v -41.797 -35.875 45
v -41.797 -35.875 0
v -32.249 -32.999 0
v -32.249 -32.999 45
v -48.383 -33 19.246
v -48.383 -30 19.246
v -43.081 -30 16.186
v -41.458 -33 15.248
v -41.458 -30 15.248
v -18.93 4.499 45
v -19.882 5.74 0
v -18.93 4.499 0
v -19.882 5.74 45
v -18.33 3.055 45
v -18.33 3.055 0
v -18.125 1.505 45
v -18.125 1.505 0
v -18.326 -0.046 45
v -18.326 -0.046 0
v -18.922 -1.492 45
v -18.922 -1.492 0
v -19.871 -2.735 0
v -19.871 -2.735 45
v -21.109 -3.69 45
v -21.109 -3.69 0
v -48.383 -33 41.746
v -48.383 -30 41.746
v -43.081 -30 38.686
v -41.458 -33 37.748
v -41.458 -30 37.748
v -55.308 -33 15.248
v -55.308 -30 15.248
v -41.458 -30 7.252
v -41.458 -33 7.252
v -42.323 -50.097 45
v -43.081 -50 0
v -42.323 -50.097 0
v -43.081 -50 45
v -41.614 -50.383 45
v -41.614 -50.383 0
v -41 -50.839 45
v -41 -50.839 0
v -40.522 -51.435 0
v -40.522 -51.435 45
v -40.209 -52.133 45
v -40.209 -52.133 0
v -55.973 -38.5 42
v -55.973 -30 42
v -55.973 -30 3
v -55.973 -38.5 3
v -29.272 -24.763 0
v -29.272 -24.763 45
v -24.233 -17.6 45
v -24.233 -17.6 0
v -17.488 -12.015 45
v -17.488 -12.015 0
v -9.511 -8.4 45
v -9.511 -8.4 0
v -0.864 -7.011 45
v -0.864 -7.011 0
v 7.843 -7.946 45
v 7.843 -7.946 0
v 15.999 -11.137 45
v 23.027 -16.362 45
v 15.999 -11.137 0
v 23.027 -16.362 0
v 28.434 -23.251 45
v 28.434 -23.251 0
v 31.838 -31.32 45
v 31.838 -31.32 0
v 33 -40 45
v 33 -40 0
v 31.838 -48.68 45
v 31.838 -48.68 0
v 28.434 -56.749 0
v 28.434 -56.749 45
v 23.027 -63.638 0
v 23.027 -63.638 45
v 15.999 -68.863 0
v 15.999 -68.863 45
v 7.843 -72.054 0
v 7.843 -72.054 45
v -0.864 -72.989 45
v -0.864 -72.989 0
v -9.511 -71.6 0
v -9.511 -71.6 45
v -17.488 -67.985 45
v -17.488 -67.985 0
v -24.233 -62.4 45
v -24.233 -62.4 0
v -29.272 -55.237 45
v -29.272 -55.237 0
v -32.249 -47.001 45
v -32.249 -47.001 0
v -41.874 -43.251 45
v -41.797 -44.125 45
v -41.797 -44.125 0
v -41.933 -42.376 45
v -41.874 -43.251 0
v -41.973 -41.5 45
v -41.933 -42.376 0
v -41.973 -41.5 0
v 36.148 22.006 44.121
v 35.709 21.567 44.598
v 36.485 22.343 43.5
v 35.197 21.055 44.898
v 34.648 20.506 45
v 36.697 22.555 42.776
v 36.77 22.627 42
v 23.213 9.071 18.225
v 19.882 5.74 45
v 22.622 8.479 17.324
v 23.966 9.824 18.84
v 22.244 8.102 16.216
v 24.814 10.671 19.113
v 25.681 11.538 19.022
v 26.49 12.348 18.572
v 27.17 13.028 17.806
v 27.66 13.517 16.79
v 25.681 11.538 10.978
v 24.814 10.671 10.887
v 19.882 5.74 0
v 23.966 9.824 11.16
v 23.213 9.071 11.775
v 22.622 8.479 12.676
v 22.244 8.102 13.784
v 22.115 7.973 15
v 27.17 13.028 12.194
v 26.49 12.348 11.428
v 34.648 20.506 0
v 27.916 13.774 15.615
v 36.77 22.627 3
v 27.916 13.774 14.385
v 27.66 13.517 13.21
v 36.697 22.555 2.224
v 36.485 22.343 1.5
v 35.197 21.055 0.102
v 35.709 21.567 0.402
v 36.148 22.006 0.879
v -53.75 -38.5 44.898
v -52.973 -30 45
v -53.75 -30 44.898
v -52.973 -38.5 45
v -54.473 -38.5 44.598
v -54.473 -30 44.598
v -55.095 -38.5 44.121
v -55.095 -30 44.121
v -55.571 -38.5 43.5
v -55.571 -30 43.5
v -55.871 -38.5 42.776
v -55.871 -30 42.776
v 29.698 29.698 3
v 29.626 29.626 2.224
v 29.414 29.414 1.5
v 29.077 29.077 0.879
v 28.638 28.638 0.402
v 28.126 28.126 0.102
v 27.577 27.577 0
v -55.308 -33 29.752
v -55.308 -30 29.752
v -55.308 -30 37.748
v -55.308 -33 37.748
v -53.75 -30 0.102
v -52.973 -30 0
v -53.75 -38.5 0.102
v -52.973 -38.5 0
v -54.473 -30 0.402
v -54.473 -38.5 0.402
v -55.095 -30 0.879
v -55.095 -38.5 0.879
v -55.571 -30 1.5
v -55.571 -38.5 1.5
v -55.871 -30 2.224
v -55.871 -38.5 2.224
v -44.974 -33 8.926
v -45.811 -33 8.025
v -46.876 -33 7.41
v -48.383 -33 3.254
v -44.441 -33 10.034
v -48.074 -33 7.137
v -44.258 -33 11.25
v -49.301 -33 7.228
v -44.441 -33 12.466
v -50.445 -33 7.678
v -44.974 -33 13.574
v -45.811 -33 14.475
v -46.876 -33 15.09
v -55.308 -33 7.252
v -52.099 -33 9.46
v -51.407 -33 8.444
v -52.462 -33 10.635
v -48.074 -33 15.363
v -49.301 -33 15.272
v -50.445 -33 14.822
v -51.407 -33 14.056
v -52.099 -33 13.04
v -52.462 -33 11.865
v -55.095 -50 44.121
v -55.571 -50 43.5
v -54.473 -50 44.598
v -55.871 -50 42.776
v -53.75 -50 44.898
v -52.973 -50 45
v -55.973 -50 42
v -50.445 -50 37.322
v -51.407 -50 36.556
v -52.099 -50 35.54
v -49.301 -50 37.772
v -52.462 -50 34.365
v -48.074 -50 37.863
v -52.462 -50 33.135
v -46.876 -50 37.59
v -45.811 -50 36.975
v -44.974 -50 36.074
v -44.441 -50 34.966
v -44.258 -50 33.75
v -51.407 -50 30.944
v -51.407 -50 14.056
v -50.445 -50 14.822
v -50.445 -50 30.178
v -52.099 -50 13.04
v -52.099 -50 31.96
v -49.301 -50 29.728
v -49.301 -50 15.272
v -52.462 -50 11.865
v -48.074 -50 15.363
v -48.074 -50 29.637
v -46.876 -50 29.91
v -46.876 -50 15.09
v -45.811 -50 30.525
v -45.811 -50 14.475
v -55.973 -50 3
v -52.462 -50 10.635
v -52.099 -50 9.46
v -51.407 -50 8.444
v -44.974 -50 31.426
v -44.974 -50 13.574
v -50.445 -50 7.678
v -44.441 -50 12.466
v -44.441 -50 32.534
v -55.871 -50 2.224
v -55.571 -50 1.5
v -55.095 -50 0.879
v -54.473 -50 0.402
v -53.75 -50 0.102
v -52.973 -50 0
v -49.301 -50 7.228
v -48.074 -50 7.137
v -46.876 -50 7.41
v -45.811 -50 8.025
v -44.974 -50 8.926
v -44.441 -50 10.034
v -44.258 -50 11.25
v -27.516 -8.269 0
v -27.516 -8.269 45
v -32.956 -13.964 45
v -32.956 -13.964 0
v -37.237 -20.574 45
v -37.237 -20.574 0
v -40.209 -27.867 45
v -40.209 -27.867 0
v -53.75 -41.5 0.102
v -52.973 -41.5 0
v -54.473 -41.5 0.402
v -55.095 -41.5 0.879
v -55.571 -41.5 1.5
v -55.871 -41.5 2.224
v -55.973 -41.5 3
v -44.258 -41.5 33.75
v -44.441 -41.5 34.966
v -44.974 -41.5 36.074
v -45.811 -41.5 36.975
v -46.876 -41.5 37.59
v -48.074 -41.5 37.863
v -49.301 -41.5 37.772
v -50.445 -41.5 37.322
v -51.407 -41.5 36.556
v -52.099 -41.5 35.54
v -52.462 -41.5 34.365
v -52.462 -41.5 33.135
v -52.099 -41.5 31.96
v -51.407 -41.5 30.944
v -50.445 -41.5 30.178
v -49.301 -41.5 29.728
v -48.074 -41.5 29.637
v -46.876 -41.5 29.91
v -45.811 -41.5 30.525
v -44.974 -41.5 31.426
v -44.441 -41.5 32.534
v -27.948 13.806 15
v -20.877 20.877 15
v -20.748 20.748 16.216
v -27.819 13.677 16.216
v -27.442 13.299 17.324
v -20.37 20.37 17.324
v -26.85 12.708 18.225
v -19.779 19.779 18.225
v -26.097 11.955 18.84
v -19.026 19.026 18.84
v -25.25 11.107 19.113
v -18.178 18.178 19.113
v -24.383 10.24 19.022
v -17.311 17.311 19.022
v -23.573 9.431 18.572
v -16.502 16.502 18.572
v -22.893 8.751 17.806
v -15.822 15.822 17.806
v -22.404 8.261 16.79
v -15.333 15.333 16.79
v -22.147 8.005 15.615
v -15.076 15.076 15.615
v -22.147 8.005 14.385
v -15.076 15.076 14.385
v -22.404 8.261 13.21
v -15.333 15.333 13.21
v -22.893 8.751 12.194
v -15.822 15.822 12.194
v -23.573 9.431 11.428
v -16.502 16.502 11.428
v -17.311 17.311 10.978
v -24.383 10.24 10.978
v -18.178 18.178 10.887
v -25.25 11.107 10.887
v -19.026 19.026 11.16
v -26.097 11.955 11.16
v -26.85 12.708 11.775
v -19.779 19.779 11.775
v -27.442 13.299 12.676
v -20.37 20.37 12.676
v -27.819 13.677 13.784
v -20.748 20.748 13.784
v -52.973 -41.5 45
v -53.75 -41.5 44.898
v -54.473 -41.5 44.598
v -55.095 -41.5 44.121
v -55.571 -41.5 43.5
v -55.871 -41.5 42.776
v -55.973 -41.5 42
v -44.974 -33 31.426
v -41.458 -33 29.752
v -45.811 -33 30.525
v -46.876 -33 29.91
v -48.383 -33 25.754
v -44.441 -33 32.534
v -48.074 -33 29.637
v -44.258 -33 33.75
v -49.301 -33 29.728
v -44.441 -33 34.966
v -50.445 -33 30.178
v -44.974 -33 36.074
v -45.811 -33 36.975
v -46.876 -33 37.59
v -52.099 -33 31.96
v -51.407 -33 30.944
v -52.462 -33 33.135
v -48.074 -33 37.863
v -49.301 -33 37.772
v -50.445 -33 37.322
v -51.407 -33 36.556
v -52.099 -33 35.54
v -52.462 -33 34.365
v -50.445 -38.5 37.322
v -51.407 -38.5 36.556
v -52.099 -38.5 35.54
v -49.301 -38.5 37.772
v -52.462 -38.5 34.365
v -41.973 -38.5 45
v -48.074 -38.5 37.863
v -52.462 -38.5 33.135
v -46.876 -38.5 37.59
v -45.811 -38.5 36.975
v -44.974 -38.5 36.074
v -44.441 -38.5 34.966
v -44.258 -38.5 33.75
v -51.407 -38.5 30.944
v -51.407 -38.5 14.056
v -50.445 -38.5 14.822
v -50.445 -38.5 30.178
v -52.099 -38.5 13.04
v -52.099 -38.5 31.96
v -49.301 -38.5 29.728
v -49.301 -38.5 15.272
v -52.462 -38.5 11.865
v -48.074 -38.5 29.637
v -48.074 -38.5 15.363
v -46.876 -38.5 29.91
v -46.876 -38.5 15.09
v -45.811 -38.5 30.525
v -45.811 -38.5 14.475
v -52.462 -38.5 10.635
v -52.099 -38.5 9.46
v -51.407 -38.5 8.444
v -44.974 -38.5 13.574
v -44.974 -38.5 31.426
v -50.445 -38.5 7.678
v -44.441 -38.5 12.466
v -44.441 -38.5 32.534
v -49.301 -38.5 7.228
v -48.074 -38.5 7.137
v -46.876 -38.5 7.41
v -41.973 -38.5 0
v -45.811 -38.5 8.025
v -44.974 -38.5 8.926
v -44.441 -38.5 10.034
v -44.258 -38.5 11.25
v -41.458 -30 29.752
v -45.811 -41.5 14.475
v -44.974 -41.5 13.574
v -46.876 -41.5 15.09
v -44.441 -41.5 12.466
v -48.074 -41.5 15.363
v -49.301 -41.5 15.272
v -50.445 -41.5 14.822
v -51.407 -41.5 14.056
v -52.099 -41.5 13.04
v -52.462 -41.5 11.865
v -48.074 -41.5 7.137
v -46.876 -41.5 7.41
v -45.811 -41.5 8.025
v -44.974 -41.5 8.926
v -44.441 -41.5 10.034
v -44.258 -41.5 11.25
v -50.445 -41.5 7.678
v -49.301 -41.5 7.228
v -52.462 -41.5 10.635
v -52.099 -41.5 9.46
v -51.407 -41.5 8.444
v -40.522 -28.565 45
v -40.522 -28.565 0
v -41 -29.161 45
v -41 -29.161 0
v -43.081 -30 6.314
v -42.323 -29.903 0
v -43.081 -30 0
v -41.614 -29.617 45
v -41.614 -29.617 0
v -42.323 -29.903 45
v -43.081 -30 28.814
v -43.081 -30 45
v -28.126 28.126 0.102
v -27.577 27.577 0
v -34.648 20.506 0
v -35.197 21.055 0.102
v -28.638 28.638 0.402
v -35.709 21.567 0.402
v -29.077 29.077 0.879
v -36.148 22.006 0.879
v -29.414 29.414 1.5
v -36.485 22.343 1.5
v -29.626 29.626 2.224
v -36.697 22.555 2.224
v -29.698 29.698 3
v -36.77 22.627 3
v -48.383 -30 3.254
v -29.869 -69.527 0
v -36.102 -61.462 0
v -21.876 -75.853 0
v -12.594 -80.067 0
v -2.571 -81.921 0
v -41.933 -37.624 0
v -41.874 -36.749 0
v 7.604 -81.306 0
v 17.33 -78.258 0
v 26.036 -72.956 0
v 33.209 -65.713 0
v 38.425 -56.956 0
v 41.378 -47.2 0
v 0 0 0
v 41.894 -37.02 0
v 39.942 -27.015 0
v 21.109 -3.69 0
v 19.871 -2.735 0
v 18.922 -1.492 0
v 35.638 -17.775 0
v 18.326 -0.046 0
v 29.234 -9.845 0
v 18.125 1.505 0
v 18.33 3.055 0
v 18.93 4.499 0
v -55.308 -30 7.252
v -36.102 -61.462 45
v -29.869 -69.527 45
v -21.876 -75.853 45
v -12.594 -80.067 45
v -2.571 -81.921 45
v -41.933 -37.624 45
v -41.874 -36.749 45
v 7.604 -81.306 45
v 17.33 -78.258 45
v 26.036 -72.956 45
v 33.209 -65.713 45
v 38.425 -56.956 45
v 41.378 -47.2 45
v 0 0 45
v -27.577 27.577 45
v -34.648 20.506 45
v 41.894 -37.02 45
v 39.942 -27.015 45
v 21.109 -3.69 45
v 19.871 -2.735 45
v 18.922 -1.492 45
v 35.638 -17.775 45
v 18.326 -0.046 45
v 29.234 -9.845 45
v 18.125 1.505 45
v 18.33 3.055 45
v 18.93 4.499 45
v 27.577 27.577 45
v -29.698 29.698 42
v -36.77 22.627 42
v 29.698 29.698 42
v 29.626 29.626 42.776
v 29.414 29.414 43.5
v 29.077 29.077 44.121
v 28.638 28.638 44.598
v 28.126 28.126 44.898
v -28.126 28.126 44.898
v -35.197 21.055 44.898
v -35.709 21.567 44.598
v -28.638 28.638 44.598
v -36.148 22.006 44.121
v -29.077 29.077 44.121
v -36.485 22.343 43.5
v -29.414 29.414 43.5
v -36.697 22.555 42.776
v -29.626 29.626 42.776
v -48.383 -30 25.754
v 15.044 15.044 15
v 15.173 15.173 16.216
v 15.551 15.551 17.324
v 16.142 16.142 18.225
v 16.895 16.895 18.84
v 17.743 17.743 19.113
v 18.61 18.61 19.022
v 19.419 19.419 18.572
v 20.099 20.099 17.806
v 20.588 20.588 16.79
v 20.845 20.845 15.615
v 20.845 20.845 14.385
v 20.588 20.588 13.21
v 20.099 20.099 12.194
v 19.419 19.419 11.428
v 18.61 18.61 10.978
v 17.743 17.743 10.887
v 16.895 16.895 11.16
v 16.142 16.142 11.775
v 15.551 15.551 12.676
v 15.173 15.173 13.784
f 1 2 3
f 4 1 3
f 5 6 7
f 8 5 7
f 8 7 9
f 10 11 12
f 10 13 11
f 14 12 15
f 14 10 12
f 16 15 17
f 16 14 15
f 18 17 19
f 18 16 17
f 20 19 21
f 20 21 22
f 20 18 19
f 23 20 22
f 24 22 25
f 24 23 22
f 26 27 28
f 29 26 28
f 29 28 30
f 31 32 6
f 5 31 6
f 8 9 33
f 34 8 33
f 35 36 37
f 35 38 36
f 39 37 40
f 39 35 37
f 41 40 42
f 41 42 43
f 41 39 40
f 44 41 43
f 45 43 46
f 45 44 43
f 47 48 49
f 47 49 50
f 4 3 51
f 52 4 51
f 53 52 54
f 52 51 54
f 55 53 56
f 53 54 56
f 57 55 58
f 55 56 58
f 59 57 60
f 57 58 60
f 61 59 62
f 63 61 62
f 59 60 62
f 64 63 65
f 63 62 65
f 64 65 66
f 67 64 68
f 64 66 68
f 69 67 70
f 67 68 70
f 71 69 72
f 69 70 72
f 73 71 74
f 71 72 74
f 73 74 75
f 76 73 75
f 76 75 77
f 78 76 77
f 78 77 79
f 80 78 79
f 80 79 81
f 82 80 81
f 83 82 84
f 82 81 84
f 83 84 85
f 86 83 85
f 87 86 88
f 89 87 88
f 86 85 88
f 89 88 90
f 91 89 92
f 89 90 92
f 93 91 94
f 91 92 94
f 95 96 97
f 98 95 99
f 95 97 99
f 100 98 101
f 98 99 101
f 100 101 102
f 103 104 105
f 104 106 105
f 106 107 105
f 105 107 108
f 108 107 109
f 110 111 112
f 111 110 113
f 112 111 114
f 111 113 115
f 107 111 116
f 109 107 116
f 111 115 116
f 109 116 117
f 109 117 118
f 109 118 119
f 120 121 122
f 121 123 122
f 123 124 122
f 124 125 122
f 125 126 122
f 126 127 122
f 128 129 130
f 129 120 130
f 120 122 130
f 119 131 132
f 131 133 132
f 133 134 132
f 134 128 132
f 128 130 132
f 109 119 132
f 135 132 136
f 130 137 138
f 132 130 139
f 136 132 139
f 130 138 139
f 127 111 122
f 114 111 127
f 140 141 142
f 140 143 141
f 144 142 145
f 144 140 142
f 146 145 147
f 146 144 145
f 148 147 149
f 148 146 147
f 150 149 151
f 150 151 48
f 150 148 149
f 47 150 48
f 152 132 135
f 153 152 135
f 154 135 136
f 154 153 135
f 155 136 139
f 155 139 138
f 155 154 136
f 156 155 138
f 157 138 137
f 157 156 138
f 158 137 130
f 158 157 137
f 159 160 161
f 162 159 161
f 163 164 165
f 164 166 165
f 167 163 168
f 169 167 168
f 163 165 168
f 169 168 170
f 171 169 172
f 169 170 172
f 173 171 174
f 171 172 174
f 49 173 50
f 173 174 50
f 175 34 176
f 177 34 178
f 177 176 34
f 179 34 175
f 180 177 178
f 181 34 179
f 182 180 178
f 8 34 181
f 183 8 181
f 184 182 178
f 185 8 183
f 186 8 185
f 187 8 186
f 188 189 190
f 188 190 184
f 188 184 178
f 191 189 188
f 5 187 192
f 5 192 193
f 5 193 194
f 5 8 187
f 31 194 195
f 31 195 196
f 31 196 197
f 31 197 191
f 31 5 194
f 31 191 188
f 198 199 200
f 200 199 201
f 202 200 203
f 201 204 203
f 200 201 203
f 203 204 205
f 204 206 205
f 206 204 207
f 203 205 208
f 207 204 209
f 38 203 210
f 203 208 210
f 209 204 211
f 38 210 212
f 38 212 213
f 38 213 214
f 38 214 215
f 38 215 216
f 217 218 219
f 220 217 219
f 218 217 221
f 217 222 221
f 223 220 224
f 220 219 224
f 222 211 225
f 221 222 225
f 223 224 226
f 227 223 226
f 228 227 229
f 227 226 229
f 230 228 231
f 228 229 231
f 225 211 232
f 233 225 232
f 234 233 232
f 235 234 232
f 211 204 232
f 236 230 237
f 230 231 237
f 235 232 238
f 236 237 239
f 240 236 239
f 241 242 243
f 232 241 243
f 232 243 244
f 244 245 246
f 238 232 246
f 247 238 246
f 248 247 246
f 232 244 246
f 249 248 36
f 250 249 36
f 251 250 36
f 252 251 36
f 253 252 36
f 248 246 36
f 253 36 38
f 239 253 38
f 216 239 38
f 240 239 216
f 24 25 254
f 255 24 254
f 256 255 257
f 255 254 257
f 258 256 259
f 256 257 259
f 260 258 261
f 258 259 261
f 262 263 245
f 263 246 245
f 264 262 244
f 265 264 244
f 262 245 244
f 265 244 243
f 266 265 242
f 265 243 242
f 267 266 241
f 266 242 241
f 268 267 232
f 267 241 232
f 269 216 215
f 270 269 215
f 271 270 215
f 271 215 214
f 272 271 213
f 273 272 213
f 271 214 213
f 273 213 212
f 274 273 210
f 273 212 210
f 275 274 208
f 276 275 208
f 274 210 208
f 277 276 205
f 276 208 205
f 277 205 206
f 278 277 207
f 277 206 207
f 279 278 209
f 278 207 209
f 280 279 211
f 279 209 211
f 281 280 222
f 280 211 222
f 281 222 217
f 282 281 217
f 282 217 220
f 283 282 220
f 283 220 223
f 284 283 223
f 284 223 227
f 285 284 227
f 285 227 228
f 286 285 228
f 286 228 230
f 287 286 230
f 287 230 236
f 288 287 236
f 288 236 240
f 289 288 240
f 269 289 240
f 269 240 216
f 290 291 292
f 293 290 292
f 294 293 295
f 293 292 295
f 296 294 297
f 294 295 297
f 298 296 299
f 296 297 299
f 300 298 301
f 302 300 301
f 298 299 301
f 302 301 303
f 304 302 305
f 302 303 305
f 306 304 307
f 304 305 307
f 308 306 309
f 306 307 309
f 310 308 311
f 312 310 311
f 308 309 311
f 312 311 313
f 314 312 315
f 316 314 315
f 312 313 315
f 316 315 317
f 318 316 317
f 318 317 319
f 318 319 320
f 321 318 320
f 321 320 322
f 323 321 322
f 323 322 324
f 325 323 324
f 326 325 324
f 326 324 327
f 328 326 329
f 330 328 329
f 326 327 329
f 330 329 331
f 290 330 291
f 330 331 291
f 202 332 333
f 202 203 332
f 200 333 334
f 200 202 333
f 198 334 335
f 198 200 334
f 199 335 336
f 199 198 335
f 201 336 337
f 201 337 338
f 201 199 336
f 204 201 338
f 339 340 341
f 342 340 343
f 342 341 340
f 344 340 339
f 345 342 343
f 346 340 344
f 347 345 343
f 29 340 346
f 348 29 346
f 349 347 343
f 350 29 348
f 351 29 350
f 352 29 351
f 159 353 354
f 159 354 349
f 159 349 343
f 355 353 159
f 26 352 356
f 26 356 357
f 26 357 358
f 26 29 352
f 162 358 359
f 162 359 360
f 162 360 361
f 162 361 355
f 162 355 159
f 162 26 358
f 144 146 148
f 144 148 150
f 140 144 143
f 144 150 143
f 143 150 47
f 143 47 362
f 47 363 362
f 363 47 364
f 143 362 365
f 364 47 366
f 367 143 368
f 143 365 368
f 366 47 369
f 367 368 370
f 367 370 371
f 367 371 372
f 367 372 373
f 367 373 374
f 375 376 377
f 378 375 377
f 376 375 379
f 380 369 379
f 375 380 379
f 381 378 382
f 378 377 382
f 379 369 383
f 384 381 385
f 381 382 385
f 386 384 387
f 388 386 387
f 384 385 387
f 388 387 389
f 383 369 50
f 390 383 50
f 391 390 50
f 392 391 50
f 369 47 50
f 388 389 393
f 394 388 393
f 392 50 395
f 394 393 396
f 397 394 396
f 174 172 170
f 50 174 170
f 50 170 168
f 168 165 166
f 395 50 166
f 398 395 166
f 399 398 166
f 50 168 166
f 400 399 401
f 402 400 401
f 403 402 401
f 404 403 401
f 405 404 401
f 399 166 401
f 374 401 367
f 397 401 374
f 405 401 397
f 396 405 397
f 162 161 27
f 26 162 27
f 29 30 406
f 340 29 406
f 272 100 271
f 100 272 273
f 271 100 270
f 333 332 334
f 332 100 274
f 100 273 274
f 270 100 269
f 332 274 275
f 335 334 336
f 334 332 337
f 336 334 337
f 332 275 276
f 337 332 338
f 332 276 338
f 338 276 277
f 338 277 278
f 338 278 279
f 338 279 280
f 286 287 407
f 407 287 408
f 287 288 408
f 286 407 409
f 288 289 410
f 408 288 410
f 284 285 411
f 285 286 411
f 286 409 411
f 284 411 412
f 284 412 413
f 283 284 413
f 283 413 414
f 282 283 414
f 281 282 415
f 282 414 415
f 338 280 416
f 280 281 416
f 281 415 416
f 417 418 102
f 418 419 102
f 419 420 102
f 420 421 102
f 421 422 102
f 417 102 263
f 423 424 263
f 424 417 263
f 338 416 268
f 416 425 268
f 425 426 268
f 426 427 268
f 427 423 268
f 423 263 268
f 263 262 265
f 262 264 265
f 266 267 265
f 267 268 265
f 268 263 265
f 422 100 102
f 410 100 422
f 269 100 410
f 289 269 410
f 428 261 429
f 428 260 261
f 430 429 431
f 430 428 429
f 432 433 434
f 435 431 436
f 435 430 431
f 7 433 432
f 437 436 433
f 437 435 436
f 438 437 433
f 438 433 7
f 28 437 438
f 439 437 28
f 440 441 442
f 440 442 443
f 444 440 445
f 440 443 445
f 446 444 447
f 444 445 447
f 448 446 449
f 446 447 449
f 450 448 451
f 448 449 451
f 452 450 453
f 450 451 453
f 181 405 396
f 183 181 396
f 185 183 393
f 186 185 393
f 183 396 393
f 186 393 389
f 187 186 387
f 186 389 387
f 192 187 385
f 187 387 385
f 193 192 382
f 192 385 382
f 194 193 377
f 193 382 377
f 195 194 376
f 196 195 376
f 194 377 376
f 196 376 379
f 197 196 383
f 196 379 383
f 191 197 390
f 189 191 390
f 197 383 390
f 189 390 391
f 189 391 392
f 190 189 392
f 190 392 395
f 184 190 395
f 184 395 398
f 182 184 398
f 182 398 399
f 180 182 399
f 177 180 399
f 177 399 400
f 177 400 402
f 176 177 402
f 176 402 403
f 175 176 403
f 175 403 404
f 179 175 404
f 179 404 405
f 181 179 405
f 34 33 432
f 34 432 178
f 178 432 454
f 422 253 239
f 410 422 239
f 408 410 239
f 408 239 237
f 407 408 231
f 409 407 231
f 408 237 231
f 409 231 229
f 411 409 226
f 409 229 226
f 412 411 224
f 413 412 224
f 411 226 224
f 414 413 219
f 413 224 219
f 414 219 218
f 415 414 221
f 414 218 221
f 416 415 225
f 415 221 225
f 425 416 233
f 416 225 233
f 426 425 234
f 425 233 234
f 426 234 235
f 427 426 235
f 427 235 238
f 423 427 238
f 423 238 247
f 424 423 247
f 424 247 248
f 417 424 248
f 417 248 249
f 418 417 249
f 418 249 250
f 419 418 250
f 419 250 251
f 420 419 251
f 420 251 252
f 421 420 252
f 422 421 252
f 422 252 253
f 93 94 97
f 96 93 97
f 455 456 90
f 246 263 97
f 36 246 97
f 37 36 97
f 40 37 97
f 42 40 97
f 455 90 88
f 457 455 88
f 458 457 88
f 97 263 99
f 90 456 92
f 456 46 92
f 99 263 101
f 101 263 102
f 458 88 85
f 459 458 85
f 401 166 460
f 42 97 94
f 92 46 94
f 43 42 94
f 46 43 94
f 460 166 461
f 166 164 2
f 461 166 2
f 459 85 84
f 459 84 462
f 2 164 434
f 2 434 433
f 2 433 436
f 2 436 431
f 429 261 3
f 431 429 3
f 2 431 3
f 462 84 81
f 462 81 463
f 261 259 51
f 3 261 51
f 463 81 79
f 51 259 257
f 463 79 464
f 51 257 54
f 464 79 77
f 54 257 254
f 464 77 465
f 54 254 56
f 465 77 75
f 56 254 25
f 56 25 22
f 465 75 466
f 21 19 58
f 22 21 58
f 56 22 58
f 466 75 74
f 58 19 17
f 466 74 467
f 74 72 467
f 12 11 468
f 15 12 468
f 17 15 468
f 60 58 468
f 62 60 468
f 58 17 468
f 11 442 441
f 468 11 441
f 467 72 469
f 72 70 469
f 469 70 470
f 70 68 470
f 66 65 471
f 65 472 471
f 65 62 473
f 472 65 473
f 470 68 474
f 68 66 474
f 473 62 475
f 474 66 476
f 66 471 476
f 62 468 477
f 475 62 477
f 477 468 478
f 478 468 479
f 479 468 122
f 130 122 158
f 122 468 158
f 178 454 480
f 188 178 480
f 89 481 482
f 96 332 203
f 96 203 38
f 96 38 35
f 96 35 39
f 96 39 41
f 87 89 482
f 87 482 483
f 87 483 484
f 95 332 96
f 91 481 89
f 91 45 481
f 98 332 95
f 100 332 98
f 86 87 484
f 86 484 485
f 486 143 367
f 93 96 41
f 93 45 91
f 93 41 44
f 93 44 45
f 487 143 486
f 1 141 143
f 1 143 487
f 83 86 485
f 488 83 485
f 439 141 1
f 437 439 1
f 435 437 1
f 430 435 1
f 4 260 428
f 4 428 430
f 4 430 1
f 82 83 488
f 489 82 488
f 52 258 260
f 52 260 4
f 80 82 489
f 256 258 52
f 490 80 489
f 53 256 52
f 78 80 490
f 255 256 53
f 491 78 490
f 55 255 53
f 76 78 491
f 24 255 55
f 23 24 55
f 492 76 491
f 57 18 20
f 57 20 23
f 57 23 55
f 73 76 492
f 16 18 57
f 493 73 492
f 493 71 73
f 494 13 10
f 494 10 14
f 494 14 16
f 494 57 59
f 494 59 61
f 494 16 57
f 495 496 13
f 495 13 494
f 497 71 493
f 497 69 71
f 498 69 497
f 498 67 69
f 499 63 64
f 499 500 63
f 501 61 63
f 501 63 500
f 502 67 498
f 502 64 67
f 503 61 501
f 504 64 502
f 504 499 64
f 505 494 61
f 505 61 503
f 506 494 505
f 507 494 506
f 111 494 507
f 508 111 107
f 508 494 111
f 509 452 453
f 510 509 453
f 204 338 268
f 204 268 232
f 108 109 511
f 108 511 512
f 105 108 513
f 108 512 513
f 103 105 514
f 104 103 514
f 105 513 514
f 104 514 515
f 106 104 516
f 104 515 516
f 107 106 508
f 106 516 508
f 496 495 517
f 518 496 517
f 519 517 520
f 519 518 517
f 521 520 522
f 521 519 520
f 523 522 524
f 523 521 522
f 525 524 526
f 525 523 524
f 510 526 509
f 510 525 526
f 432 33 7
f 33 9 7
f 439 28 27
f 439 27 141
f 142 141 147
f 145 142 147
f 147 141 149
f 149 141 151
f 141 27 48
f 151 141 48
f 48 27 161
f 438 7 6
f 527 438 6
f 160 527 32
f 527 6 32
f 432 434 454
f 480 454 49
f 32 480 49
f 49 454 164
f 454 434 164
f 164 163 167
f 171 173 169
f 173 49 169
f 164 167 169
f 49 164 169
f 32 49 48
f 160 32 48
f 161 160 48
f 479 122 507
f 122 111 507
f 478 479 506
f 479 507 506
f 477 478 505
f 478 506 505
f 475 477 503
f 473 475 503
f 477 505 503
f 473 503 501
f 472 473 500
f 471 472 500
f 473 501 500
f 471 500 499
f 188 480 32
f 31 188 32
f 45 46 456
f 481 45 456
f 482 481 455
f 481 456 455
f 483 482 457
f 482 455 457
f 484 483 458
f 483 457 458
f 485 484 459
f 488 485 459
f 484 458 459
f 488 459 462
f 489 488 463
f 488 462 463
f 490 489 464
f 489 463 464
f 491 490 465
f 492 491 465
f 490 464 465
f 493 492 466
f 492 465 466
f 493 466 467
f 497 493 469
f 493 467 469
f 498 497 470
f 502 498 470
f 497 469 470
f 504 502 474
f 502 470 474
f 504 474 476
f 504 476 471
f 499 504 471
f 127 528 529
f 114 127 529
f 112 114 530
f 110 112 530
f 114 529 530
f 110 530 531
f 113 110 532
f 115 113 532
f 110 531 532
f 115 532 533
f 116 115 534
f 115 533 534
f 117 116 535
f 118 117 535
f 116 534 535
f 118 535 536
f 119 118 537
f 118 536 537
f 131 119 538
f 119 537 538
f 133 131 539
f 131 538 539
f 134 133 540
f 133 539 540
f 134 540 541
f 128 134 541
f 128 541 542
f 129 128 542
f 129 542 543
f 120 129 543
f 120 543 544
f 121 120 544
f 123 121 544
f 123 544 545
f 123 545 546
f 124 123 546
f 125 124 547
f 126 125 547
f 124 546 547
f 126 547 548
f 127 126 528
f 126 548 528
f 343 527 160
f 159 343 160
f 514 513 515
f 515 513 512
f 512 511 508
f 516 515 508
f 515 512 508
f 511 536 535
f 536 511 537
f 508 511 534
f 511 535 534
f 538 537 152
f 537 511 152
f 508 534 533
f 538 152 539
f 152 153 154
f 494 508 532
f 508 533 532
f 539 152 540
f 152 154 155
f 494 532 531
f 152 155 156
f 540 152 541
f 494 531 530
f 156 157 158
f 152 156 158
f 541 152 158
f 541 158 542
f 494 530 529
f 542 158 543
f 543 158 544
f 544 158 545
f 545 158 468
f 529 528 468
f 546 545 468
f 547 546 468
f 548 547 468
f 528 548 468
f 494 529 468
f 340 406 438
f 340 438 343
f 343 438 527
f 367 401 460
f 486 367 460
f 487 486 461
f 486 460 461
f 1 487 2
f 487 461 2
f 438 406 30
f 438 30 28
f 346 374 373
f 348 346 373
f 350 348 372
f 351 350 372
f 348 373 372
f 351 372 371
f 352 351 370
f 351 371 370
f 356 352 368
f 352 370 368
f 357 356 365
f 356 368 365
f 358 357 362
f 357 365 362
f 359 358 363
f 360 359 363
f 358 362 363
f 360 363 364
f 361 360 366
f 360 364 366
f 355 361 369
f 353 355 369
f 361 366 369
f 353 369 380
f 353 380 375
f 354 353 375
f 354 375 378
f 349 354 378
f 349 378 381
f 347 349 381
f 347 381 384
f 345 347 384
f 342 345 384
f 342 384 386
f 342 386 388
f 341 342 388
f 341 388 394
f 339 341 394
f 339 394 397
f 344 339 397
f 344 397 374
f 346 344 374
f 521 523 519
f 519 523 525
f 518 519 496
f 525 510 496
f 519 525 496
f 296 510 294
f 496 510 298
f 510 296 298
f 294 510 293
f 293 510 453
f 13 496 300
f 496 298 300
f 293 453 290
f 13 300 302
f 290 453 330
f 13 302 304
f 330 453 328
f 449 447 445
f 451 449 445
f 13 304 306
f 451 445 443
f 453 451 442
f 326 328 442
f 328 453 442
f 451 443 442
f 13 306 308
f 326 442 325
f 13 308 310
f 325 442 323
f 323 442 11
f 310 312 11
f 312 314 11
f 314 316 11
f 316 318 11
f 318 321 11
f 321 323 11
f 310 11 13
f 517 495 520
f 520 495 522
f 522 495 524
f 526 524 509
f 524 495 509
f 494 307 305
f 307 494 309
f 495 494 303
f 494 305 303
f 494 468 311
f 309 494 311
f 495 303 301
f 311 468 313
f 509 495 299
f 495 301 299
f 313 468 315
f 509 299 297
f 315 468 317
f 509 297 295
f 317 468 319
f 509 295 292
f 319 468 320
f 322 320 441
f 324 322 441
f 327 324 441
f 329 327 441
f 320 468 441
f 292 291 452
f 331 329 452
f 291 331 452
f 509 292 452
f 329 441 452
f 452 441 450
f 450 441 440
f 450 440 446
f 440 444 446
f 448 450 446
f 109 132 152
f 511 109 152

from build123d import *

# Parameters (mm, degrees)
F1_DEPTH  = 45
F2_R      = 4.125
F3_DEPTH  = 10
F4_R      = 4.125
F5_DEPTH  = 10
F6_R      = 4.125
F7_DEPTH  = 20
F8_R      = 3
F10_DEPTH = 3
F11_R     = 6


with BuildPart() as f1:
    # F0 (on Top) → F1 (new body)
    with BuildSketch(Plane.XY):
        with BuildLine():
            Line((29.698485, 29.698485), (0, 0))
            Line((0, 0), (-29.698485, 29.698485))
            Line((-29.698485, 29.698485), (-36.769553, 22.627417))
            Line((-36.769553, 22.627417), (-13.80761, -0.334525))
            ThreePointArc((-13.80761, -0.334525), (-31.069176, -11.738608), (-40.792156, -30))
            ThreePointArc((-40.792156, -30), (-41.398908, -32.919715), (-41.796954, -35.875124))
            Line((-41.796954, -35.875124), (-32.248766, -32.998781))
            ThreePointArc((-32.248766, -32.998781), (33, -40), (-32.248766, -47.001219))
            Line((-32.248766, -47.001219), (-41.796954, -44.124876))
            ThreePointArc((-41.796954, -44.124876), (-41.398908, -47.080285), (-40.792156, -50))
            ThreePointArc((-40.792156, -50), (28.261392, -71.069176), (13.80761, -0.334525))
            Line((13.80761, -0.334525), (36.769553, 22.627417))
            Line((36.769553, 22.627417), (29.698485, 29.698485))
        make_face()
        with BuildLine():
            ThreePointArc((-41.796954, -35.875124), (-41.398908, -32.919715), (-40.792156, -30))
            Line((-40.792156, -30), (-55.973206, -30))
            Line((-55.973206, -30), (-55.973206, -38.5))
            Line((-55.973206, -38.5), (-41.973206, -38.5))
            ThreePointArc((-41.973206, -38.5), (-41.905637, -37.186182), (-41.796954, -35.875124))
        make_face()
        with BuildLine():
            Line((-55.973206, -50), (-40.792156, -50))
            ThreePointArc((-40.792156, -50), (-41.398908, -47.080285), (-41.796954, -44.124876))
            ThreePointArc((-41.796954, -44.124876), (-41.905637, -42.813818), (-41.973206, -41.5))
            Line((-41.973206, -41.5), (-55.973206, -41.5))
            Line((-55.973206, -41.5), (-55.973206, -50))
        make_face()
    extrude(amount=F1_DEPTH)

    # F2 (on face) → F3 (cut, through all)
    with BuildSketch(Plane(origin=(0, 0, 0), x_dir=(-0.707107, -0.707107, 0), z_dir=(-0.707107, 0.707107, 0))):
        with Locations((-25.4, 15)):
            Circle(F2_R)
    extrude(amount=-F3_DEPTH, mode=Mode.SUBTRACT)

    # F4 (on face) → F5 (cut, through all)
    with BuildSketch(Plane(origin=(0, 0, 0), x_dir=(-0.707107, 0.707107, 0), z_dir=(0.707107, 0.707107, 0))):
        with Locations((25.4, 15)):
            Circle(F4_R)
    extrude(amount=-F5_DEPTH, mode=Mode.SUBTRACT)

    # F6 (on face) → F7 (cut, through all)
    with BuildSketch(Plane.XZ.offset(50)):
        with Locations((-48.382681, 33.75)):
            Circle(F6_R)
        with Locations((-48.382681, 11.25)):
            Circle(F6_R)
    extrude(amount=-F7_DEPTH, mode=Mode.SUBTRACT)

    # F8
    f8_edges = [f1.edges().sort_by_distance(p)[0] for p in [
        (-55.973206, -34.25, 45),
        (-55.973206, -45.75, 45),
        (-55.973206, -45.75, 0),
        (-55.973206, -34.25, 0),
        (-33.234019, 26.162951, 45),
        (33.234019, 26.162951, 45),
        (33.234019, 26.162951, 0),
        (-33.234019, 26.162951, 0),
        (-40.792156, -30, 22.5),
        (-40.792156, -50, 22.5),
    ]]
    fillet(f8_edges, radius=F8_R)

    # F9 (on face) → F10 (cut)
    with BuildSketch(Plane(origin=(0, -30, 0), x_dir=(-1, 0, 0), z_dir=(0, 1, 0))):
        Polygon((55.307681, 37.748151), (48.382681, 41.746301), (41.457681, 37.748151), (41.457681, 29.751849), (48.382681, 25.753699), (55.307681, 29.751849), align=None)
        Polygon((55.307681, 7.251849), (55.307681, 15.248151), (48.382681, 19.246301), (41.457681, 15.248151), (41.457681, 7.251849), (48.382681, 3.253699), align=None)
    extrude(amount=-F10_DEPTH, mode=Mode.SUBTRACT)

    # F11
    f11_edges = [f1.edges().sort_by_distance(p)[0] for p in [
        (-13.80761, -0.334525, 22.5),
        (13.80761, -0.334525, 22.5),
    ]]
    fillet(f11_edges, radius=F11_R)


solid = f1.part
